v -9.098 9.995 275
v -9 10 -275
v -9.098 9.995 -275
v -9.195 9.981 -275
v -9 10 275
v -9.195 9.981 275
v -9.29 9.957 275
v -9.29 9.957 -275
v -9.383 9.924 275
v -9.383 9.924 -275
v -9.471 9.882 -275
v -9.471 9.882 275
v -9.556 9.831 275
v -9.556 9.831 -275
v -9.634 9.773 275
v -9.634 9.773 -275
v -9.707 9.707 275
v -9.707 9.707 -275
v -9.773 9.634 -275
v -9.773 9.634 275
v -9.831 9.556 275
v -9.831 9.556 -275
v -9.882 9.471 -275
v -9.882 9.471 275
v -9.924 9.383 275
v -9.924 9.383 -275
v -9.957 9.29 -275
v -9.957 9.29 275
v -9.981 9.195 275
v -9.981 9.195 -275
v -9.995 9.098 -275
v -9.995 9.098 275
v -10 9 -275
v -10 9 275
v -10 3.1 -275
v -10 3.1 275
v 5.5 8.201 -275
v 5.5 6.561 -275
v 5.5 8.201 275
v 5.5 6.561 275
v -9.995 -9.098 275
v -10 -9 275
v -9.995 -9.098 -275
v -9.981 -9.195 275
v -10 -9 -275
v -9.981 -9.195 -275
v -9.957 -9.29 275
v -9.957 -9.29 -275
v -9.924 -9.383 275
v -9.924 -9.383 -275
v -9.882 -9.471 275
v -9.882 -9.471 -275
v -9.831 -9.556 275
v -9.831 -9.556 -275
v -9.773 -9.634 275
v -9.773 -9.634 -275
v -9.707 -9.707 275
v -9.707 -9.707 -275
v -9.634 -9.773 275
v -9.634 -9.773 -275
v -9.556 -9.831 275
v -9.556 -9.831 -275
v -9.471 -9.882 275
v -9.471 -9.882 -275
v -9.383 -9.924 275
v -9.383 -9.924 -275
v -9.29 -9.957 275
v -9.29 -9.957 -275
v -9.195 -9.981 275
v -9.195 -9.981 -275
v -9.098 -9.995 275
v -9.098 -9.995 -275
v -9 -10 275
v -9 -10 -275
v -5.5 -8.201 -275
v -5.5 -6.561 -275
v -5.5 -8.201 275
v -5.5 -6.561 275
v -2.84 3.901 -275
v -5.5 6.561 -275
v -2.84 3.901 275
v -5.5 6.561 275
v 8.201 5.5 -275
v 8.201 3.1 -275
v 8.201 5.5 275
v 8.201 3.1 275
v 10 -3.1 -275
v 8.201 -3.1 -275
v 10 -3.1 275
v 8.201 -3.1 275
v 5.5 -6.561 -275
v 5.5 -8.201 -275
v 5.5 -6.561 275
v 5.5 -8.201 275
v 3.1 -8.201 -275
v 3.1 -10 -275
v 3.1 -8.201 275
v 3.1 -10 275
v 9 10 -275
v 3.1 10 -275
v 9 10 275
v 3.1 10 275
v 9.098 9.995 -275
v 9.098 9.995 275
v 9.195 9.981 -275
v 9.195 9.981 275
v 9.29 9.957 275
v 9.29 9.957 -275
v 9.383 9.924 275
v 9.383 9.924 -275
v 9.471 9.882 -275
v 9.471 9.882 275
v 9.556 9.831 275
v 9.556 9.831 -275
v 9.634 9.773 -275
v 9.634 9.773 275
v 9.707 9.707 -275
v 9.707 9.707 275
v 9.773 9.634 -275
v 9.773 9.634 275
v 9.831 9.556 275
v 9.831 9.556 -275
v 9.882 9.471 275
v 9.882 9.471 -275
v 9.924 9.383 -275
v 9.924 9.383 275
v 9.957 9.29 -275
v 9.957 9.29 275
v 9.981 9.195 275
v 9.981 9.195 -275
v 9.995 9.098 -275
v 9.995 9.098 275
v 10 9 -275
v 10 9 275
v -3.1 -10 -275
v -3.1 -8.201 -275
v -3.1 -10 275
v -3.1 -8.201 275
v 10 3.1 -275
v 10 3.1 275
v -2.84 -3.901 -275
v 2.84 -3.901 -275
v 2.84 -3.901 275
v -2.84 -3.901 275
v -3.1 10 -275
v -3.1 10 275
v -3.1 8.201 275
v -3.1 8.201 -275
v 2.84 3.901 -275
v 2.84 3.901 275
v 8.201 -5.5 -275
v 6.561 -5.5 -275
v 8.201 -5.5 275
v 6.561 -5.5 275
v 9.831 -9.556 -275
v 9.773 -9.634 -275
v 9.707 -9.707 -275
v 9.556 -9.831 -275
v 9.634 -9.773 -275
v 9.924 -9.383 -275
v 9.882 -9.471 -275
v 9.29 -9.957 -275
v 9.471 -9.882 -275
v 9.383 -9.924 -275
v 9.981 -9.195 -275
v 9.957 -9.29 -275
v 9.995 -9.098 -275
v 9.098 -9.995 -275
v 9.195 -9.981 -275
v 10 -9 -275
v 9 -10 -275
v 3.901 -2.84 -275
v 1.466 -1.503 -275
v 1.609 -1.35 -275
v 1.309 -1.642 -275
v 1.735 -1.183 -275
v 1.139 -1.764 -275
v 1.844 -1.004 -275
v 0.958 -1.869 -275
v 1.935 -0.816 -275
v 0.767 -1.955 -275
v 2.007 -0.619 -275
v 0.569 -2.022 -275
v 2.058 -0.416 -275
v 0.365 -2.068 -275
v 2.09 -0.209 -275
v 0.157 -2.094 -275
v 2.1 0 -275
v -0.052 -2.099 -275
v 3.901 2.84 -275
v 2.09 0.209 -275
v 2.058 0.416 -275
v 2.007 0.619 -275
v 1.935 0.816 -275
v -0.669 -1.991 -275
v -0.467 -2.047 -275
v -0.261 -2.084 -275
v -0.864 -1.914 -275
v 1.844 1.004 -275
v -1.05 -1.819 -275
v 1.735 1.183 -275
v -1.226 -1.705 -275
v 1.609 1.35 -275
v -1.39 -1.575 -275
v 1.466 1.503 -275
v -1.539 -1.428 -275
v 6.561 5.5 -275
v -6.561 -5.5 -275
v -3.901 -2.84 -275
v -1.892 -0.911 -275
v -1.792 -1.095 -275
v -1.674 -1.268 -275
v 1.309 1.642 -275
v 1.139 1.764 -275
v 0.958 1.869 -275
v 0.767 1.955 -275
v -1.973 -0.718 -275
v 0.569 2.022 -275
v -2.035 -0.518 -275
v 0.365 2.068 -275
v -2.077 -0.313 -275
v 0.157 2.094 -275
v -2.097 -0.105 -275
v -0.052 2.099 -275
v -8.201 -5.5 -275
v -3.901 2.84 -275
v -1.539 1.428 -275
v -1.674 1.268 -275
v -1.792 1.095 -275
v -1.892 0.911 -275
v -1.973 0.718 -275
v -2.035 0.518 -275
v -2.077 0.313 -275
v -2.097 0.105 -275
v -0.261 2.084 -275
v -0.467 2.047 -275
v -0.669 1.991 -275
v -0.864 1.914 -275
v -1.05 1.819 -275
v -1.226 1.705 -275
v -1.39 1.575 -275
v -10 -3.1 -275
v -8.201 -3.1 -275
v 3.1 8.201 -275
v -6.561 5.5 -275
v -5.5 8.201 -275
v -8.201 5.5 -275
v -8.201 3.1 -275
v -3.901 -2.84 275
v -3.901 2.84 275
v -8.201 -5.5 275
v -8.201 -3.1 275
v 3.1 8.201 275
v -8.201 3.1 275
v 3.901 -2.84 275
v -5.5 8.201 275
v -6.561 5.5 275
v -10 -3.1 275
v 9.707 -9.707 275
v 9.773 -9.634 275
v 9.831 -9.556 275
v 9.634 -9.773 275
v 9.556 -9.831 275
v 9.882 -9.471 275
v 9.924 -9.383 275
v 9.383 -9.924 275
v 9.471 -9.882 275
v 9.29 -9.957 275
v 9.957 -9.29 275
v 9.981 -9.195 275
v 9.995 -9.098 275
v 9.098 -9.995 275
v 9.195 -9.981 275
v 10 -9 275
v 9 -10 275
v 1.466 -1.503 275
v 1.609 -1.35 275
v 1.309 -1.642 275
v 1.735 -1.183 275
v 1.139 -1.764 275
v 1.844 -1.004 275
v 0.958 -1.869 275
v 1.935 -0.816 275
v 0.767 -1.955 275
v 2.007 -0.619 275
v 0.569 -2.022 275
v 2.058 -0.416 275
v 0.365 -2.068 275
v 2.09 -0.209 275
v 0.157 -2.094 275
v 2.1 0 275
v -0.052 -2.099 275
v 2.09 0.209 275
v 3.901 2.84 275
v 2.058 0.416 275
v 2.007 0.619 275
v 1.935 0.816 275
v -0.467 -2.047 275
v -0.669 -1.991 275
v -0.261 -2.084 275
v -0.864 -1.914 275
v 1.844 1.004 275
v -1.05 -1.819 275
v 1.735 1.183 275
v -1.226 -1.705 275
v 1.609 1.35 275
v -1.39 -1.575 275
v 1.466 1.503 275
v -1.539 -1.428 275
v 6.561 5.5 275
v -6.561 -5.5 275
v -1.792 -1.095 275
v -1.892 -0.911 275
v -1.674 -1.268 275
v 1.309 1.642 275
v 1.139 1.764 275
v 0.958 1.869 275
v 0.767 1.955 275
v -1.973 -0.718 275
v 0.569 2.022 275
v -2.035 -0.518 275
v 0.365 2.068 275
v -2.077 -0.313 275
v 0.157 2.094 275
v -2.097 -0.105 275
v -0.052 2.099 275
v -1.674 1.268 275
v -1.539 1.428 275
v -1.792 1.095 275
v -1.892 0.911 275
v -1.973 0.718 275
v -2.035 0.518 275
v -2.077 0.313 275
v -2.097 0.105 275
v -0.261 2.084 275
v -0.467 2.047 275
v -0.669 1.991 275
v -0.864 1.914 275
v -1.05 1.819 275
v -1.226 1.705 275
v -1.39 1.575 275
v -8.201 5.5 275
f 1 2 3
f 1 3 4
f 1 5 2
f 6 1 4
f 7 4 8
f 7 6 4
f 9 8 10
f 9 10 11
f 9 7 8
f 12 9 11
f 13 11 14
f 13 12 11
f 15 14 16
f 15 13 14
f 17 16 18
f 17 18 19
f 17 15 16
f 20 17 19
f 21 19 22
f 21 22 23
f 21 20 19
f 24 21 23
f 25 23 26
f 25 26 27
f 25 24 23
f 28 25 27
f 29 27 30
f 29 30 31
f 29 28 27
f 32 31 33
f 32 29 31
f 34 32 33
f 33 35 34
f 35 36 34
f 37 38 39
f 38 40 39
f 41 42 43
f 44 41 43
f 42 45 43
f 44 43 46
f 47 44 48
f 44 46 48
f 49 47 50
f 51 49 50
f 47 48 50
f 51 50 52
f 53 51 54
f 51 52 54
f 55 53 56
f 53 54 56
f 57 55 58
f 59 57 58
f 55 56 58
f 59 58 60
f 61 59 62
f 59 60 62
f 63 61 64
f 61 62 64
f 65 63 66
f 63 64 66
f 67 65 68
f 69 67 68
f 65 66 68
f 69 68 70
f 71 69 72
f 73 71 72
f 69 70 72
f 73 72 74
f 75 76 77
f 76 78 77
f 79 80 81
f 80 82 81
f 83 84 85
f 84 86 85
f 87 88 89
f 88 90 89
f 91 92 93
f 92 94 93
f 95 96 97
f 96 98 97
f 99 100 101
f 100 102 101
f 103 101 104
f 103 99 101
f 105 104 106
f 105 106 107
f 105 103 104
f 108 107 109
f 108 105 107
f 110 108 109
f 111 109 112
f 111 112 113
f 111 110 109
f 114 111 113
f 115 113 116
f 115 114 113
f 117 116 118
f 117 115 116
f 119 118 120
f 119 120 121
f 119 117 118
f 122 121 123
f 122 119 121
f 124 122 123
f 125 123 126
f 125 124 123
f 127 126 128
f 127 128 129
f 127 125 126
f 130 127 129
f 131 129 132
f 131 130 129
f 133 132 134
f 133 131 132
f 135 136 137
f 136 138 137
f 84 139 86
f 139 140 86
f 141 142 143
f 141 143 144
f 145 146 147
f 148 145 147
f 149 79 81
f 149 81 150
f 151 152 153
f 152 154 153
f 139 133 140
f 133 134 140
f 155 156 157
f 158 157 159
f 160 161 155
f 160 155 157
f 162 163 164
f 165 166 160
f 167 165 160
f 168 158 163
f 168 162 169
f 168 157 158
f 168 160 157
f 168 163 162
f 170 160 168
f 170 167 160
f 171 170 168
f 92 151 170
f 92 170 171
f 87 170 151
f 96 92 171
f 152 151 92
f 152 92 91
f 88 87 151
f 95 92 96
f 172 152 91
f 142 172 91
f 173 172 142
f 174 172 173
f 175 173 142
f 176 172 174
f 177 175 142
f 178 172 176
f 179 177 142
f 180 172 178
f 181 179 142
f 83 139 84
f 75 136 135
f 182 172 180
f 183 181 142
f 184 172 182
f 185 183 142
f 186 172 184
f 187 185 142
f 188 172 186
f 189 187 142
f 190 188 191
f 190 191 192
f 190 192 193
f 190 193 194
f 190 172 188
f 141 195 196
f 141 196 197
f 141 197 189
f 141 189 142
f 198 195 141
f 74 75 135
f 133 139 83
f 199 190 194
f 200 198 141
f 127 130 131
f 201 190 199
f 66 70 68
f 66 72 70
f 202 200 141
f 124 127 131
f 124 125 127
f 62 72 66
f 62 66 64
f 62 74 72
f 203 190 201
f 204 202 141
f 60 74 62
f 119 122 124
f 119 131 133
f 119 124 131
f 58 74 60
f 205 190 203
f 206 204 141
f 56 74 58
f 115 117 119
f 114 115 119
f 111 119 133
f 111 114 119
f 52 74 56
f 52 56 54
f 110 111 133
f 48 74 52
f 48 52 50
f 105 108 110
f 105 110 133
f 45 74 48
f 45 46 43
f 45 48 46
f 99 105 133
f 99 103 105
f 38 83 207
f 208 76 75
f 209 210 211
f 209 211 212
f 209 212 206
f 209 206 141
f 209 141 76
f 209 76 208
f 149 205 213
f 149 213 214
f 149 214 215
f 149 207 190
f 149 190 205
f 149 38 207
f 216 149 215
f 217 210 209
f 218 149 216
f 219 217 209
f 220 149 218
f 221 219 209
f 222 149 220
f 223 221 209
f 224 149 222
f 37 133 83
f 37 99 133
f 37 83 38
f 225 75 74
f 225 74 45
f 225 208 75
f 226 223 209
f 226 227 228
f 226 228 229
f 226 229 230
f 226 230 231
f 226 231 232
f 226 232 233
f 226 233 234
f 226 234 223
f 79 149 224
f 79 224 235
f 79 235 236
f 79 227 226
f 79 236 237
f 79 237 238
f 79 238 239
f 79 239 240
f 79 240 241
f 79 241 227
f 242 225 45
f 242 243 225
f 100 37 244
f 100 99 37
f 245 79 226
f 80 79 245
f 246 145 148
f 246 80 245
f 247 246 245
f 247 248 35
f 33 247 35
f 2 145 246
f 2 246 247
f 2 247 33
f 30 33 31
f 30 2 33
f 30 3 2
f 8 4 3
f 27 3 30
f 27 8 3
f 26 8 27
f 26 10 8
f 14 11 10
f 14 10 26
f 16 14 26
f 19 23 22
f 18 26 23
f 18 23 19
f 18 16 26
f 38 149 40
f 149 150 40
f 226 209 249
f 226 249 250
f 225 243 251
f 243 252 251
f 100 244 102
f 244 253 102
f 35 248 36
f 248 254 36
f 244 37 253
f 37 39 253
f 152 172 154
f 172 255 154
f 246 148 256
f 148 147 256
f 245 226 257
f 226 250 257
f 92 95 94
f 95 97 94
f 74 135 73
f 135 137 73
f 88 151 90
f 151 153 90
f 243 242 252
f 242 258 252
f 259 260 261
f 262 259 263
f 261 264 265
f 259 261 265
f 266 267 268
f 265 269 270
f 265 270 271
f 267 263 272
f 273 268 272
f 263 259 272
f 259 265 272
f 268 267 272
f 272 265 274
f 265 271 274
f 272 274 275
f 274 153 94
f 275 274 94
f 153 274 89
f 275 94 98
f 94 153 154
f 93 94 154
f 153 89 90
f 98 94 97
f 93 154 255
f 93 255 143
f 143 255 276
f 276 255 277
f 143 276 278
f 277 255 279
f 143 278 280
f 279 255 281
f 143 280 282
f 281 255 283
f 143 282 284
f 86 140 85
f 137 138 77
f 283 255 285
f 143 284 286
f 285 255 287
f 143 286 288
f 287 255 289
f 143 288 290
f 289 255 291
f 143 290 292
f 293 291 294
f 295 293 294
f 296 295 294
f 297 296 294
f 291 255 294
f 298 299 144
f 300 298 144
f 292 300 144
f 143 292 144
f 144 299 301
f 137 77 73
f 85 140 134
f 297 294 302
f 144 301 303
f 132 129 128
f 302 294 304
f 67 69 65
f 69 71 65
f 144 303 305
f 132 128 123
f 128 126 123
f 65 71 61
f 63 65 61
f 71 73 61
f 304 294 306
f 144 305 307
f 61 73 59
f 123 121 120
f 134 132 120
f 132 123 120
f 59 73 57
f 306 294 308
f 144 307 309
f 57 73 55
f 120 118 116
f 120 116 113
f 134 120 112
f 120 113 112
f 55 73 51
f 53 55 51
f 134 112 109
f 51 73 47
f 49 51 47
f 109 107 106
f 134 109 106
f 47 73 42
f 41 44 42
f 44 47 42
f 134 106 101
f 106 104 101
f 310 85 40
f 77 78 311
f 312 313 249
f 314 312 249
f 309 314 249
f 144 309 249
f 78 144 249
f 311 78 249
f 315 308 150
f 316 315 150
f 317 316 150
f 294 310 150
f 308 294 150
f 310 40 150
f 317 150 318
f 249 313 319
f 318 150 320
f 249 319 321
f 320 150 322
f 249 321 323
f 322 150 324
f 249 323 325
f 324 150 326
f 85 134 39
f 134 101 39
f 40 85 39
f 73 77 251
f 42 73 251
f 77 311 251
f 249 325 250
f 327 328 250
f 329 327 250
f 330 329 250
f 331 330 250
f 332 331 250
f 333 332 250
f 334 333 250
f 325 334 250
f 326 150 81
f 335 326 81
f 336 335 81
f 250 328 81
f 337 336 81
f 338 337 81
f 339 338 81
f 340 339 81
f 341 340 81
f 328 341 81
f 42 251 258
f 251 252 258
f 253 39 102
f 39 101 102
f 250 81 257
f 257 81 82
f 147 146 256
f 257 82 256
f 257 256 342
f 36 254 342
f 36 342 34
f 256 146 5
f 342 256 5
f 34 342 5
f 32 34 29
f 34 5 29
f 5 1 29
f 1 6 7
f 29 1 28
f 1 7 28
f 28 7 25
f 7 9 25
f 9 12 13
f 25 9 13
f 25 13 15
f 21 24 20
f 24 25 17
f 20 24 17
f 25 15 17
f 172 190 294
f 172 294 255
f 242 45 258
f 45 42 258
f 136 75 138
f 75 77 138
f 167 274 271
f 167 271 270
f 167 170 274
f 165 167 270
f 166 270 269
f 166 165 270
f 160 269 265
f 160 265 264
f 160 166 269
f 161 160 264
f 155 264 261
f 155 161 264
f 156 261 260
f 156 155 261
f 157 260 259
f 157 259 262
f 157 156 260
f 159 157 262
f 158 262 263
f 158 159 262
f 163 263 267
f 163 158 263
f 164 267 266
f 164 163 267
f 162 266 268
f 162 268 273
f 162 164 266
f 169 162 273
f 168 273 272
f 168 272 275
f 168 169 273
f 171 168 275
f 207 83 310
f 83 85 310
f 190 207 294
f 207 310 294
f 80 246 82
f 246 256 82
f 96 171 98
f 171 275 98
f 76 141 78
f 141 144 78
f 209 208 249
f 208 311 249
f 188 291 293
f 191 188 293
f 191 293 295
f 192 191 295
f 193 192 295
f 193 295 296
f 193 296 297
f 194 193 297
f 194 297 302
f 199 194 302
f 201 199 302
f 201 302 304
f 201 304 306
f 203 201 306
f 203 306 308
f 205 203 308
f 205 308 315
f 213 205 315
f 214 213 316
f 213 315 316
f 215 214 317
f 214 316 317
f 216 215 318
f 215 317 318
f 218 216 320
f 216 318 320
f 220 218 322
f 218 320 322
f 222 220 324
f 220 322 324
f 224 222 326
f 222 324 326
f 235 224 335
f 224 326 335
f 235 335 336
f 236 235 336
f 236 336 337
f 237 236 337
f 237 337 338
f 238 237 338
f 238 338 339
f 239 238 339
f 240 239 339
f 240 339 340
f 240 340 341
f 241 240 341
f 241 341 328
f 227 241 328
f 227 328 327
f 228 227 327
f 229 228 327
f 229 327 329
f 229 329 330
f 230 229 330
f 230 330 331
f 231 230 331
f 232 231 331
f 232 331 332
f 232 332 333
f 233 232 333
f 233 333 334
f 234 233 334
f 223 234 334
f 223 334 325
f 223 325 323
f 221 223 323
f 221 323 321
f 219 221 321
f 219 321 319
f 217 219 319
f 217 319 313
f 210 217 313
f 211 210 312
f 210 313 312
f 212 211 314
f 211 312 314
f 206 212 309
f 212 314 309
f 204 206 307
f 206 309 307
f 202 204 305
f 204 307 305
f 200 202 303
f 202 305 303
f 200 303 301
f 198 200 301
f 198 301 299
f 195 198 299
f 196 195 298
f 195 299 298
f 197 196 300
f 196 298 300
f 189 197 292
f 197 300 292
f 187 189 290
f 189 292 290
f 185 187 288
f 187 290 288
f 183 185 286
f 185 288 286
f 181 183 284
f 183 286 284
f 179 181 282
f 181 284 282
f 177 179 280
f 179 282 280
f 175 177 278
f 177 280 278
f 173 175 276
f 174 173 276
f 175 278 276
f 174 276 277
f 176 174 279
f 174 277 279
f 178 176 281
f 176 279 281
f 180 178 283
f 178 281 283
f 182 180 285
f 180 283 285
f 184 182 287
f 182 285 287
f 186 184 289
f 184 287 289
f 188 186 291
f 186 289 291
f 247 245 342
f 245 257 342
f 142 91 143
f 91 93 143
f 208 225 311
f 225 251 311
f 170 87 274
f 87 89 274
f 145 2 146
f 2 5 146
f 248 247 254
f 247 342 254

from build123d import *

# Parameters (mm, degrees)
BOSS_EXTRUDE1_DEPTH = 275
SKETCH2_R           = 2.1
CUT_EXTRUDE1_DEPTH  = 551
FILLET1_R           = 1


with BuildPart() as part:
    # Sketch1 → Boss-Extrude1 (new body, symmetric)
    with BuildSketch(Plane.XY):
        Polygon((-3.1, 10), (-3.1, 8.200660172), (-5.5, 8.200660172), (-5.5, 6.560660172), (-2.84, 3.900660172), (2.84, 3.900660172), (5.5, 6.560660172), (5.5, 8.200660172), (3.1, 8.200660172), (3.1, 10), (10, 10), (10, 3.1), (8.200660172, 3.1), (8.200660172, 5.5), (6.560660172, 5.5), (3.900660172, 2.84), (3.900660172, -2.84), (6.560660172, -5.5), (8.200660172, -5.5), (8.200660172, -3.1), (10, -3.1), (10, -10), (3.1, -10), (3.1, -8.200660172), (5.5, -8.200660172), (5.5, -6.560660172), (2.84, -3.900660172), (-2.84, -3.900660172), (-5.5, -6.560660172), (-5.5, -8.200660172), (-3.1, -8.200660172), (-3.1, -10), (-10, -10), (-10, -3.1), (-8.200660172, -3.1), (-8.200660172, -5.5), (-6.560660172, -5.5), (-3.900660172, -2.84), (-3.900660172, 2.84), (-6.560660172, 5.5), (-8.200660172, 5.5), (-8.200660172, 3.1), (-10, 3.1), (-10, 10), align=None)
    extrude(amount=BOSS_EXTRUDE1_DEPTH, both=True)

    # Sketch2 → Cut-Extrude1 (cut, through all)
    with BuildSketch(Plane.XY.offset(275)):
        Circle(SKETCH2_R)
    extrude(amount=-CUT_EXTRUDE1_DEPTH, mode=Mode.SUBTRACT)

    # Fillet1
    fillet1_edges = [part.edges().sort_by_distance(p)[0] for p in [
        (-10, -10, 0),
        (-10, 10, 0),
        (10, 10, 0),
        (10, -10, 0),
    ]]
    fillet(fillet1_edges, radius=FILLET1_R)


solid = part.part
